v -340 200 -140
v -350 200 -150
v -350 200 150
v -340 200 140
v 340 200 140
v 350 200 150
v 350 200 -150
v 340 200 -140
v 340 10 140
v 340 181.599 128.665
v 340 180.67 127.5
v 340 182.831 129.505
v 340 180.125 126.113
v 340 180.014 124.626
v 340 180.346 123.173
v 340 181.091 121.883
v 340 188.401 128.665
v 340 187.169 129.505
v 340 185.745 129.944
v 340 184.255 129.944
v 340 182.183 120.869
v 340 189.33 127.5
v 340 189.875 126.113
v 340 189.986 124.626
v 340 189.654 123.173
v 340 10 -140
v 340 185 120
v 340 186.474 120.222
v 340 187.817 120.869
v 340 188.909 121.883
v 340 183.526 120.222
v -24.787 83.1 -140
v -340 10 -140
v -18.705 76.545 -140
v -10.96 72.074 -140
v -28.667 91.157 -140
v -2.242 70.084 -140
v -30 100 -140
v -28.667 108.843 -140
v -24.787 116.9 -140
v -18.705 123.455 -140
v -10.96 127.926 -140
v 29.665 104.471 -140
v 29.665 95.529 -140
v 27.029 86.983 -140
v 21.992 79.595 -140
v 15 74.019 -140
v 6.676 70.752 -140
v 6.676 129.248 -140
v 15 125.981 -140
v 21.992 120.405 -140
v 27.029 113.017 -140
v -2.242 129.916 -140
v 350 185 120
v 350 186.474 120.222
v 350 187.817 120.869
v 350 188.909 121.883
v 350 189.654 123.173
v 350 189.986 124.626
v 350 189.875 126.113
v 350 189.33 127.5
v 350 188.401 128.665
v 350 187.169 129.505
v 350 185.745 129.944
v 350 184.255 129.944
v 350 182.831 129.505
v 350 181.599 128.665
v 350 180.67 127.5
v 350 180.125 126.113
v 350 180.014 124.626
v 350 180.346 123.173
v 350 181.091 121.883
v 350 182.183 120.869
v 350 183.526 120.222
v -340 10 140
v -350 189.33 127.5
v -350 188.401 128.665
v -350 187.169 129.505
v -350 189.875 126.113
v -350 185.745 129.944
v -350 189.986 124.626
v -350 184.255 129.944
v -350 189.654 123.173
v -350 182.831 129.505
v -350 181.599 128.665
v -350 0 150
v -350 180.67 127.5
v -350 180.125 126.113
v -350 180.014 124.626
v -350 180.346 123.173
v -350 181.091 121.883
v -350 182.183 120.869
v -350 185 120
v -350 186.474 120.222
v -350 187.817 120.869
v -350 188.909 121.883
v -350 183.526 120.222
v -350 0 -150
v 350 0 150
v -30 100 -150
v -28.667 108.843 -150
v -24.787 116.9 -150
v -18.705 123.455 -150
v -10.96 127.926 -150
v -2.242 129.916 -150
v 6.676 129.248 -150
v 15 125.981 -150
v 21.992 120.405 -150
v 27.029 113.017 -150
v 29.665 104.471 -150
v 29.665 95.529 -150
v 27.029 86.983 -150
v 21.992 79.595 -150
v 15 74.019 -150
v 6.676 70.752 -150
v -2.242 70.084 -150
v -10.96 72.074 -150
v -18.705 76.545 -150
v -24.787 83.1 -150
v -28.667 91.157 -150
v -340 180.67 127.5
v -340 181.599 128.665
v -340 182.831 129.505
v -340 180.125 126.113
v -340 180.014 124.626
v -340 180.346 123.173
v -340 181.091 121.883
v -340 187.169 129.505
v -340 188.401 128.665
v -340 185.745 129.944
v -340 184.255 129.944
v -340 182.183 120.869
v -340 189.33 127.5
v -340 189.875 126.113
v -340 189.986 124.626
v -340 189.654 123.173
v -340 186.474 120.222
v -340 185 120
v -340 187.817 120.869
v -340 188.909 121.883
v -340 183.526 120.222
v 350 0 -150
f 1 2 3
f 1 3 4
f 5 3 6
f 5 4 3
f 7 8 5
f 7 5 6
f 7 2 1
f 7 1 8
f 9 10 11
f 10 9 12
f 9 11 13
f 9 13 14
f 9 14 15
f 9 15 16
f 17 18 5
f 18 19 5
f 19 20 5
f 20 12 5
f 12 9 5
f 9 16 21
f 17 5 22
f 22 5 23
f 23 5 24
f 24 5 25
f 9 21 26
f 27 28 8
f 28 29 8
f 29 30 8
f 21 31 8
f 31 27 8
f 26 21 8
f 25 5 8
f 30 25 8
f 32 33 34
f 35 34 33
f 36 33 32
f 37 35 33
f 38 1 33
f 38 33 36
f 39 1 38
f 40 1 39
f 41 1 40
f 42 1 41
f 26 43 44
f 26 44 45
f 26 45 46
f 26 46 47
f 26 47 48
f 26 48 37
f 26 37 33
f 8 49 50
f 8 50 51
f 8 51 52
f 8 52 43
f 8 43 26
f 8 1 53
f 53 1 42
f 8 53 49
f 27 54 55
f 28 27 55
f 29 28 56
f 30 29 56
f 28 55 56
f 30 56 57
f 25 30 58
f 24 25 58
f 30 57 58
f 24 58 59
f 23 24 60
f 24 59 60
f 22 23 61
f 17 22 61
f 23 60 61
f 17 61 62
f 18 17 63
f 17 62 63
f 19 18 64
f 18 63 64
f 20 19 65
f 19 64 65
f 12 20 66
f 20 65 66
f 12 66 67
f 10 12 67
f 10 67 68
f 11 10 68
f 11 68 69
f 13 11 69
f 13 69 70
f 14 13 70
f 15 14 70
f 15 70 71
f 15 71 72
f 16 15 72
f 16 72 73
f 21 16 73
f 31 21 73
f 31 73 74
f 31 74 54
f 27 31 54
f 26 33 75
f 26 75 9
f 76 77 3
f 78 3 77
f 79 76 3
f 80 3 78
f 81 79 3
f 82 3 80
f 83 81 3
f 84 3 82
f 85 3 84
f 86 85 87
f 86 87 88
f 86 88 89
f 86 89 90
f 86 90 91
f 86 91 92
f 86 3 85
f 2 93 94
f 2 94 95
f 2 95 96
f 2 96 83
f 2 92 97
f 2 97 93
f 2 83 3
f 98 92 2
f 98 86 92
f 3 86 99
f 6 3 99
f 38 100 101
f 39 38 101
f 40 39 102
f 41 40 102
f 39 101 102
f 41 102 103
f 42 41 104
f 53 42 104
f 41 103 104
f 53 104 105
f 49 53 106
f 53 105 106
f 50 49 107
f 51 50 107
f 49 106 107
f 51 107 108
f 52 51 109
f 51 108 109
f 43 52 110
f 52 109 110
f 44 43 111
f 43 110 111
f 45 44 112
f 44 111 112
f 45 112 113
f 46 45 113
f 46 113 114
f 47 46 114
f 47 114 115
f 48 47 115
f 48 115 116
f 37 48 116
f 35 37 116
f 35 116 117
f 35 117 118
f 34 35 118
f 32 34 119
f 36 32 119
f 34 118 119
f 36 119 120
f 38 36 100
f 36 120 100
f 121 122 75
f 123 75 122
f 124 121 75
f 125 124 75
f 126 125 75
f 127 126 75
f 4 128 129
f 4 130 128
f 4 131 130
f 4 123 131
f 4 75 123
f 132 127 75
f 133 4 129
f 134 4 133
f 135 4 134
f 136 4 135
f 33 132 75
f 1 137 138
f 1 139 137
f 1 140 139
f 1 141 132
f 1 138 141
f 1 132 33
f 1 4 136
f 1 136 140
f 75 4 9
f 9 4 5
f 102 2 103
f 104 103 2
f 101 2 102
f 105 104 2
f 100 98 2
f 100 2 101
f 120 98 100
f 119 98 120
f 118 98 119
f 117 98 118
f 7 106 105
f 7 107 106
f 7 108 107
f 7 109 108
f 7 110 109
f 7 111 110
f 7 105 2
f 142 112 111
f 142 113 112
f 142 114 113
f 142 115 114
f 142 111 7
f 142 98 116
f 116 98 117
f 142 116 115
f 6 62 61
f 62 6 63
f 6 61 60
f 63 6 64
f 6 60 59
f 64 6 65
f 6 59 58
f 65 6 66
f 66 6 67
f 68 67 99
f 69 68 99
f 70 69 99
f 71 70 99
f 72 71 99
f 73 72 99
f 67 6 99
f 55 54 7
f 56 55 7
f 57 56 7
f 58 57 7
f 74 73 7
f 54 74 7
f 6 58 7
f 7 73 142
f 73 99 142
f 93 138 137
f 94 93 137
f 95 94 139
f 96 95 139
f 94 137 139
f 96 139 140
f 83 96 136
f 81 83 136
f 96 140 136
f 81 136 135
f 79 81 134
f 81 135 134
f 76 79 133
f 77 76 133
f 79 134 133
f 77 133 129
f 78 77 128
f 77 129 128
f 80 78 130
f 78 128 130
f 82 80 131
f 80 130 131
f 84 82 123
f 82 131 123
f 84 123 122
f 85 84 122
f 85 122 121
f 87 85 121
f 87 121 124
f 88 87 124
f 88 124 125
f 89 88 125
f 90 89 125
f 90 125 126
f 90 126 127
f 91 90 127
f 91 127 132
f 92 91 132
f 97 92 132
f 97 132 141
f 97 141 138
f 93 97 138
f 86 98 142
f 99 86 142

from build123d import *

# Parameters (mm, degrees)
CROQUIS1_W              = 700
CROQUIS1_H              = 300
SALIENTE_EXTRUIR1_DEPTH = 200
CROQUIS2_W              = 680
CROQUIS2_H              = 280
CORTAR_EXTRUIR1_DEPTH   = 190
CROQUIS3_R              = 5
CORTAR_EXTRUIR2_DEPTH   = 700
CROQUIS4_R              = 30
CORTAR_EXTRUIR3_DEPTH   = 10


with BuildPart() as part:
    # Croquis1 → Saliente-Extruir1 (new body)
    with BuildSketch(Plane(origin=(0, 0, 0), x_dir=(1, 0, 0), z_dir=(0, 1, 0))):
        Rectangle(CROQUIS1_W, CROQUIS1_H)
    extrude(amount=SALIENTE_EXTRUIR1_DEPTH)

    # Croquis2 → Cortar-Extruir1 (cut)
    with BuildSketch(Plane(origin=(0, 200, 0), x_dir=(1, 0, 0), z_dir=(0, 1, 0))):
        Rectangle(CROQUIS2_W, CROQUIS2_H)
    extrude(amount=-CORTAR_EXTRUIR1_DEPTH, mode=Mode.SUBTRACT)

    # Croquis3 → Cortar-Extruir2 (cut)
    with BuildSketch(Plane(origin=(350, 0, 0), x_dir=(0, 0, -1), z_dir=(1, 0, 0))):
        with Locations((-125, 185)):
            Circle(CROQUIS3_R)
    extrude(amount=-CORTAR_EXTRUIR2_DEPTH, mode=Mode.SUBTRACT)

    # Croquis4 → Cortar-Extruir3 (cut)
    with BuildSketch(Plane(origin=(0, 0, -150), x_dir=(-1, 0, 0), z_dir=(0, 0, -1))):
        with Locations((0, 100)):
            Circle(CROQUIS4_R)
    extrude(amount=-CORTAR_EXTRUIR3_DEPTH, mode=Mode.SUBTRACT)


solid = part.part
